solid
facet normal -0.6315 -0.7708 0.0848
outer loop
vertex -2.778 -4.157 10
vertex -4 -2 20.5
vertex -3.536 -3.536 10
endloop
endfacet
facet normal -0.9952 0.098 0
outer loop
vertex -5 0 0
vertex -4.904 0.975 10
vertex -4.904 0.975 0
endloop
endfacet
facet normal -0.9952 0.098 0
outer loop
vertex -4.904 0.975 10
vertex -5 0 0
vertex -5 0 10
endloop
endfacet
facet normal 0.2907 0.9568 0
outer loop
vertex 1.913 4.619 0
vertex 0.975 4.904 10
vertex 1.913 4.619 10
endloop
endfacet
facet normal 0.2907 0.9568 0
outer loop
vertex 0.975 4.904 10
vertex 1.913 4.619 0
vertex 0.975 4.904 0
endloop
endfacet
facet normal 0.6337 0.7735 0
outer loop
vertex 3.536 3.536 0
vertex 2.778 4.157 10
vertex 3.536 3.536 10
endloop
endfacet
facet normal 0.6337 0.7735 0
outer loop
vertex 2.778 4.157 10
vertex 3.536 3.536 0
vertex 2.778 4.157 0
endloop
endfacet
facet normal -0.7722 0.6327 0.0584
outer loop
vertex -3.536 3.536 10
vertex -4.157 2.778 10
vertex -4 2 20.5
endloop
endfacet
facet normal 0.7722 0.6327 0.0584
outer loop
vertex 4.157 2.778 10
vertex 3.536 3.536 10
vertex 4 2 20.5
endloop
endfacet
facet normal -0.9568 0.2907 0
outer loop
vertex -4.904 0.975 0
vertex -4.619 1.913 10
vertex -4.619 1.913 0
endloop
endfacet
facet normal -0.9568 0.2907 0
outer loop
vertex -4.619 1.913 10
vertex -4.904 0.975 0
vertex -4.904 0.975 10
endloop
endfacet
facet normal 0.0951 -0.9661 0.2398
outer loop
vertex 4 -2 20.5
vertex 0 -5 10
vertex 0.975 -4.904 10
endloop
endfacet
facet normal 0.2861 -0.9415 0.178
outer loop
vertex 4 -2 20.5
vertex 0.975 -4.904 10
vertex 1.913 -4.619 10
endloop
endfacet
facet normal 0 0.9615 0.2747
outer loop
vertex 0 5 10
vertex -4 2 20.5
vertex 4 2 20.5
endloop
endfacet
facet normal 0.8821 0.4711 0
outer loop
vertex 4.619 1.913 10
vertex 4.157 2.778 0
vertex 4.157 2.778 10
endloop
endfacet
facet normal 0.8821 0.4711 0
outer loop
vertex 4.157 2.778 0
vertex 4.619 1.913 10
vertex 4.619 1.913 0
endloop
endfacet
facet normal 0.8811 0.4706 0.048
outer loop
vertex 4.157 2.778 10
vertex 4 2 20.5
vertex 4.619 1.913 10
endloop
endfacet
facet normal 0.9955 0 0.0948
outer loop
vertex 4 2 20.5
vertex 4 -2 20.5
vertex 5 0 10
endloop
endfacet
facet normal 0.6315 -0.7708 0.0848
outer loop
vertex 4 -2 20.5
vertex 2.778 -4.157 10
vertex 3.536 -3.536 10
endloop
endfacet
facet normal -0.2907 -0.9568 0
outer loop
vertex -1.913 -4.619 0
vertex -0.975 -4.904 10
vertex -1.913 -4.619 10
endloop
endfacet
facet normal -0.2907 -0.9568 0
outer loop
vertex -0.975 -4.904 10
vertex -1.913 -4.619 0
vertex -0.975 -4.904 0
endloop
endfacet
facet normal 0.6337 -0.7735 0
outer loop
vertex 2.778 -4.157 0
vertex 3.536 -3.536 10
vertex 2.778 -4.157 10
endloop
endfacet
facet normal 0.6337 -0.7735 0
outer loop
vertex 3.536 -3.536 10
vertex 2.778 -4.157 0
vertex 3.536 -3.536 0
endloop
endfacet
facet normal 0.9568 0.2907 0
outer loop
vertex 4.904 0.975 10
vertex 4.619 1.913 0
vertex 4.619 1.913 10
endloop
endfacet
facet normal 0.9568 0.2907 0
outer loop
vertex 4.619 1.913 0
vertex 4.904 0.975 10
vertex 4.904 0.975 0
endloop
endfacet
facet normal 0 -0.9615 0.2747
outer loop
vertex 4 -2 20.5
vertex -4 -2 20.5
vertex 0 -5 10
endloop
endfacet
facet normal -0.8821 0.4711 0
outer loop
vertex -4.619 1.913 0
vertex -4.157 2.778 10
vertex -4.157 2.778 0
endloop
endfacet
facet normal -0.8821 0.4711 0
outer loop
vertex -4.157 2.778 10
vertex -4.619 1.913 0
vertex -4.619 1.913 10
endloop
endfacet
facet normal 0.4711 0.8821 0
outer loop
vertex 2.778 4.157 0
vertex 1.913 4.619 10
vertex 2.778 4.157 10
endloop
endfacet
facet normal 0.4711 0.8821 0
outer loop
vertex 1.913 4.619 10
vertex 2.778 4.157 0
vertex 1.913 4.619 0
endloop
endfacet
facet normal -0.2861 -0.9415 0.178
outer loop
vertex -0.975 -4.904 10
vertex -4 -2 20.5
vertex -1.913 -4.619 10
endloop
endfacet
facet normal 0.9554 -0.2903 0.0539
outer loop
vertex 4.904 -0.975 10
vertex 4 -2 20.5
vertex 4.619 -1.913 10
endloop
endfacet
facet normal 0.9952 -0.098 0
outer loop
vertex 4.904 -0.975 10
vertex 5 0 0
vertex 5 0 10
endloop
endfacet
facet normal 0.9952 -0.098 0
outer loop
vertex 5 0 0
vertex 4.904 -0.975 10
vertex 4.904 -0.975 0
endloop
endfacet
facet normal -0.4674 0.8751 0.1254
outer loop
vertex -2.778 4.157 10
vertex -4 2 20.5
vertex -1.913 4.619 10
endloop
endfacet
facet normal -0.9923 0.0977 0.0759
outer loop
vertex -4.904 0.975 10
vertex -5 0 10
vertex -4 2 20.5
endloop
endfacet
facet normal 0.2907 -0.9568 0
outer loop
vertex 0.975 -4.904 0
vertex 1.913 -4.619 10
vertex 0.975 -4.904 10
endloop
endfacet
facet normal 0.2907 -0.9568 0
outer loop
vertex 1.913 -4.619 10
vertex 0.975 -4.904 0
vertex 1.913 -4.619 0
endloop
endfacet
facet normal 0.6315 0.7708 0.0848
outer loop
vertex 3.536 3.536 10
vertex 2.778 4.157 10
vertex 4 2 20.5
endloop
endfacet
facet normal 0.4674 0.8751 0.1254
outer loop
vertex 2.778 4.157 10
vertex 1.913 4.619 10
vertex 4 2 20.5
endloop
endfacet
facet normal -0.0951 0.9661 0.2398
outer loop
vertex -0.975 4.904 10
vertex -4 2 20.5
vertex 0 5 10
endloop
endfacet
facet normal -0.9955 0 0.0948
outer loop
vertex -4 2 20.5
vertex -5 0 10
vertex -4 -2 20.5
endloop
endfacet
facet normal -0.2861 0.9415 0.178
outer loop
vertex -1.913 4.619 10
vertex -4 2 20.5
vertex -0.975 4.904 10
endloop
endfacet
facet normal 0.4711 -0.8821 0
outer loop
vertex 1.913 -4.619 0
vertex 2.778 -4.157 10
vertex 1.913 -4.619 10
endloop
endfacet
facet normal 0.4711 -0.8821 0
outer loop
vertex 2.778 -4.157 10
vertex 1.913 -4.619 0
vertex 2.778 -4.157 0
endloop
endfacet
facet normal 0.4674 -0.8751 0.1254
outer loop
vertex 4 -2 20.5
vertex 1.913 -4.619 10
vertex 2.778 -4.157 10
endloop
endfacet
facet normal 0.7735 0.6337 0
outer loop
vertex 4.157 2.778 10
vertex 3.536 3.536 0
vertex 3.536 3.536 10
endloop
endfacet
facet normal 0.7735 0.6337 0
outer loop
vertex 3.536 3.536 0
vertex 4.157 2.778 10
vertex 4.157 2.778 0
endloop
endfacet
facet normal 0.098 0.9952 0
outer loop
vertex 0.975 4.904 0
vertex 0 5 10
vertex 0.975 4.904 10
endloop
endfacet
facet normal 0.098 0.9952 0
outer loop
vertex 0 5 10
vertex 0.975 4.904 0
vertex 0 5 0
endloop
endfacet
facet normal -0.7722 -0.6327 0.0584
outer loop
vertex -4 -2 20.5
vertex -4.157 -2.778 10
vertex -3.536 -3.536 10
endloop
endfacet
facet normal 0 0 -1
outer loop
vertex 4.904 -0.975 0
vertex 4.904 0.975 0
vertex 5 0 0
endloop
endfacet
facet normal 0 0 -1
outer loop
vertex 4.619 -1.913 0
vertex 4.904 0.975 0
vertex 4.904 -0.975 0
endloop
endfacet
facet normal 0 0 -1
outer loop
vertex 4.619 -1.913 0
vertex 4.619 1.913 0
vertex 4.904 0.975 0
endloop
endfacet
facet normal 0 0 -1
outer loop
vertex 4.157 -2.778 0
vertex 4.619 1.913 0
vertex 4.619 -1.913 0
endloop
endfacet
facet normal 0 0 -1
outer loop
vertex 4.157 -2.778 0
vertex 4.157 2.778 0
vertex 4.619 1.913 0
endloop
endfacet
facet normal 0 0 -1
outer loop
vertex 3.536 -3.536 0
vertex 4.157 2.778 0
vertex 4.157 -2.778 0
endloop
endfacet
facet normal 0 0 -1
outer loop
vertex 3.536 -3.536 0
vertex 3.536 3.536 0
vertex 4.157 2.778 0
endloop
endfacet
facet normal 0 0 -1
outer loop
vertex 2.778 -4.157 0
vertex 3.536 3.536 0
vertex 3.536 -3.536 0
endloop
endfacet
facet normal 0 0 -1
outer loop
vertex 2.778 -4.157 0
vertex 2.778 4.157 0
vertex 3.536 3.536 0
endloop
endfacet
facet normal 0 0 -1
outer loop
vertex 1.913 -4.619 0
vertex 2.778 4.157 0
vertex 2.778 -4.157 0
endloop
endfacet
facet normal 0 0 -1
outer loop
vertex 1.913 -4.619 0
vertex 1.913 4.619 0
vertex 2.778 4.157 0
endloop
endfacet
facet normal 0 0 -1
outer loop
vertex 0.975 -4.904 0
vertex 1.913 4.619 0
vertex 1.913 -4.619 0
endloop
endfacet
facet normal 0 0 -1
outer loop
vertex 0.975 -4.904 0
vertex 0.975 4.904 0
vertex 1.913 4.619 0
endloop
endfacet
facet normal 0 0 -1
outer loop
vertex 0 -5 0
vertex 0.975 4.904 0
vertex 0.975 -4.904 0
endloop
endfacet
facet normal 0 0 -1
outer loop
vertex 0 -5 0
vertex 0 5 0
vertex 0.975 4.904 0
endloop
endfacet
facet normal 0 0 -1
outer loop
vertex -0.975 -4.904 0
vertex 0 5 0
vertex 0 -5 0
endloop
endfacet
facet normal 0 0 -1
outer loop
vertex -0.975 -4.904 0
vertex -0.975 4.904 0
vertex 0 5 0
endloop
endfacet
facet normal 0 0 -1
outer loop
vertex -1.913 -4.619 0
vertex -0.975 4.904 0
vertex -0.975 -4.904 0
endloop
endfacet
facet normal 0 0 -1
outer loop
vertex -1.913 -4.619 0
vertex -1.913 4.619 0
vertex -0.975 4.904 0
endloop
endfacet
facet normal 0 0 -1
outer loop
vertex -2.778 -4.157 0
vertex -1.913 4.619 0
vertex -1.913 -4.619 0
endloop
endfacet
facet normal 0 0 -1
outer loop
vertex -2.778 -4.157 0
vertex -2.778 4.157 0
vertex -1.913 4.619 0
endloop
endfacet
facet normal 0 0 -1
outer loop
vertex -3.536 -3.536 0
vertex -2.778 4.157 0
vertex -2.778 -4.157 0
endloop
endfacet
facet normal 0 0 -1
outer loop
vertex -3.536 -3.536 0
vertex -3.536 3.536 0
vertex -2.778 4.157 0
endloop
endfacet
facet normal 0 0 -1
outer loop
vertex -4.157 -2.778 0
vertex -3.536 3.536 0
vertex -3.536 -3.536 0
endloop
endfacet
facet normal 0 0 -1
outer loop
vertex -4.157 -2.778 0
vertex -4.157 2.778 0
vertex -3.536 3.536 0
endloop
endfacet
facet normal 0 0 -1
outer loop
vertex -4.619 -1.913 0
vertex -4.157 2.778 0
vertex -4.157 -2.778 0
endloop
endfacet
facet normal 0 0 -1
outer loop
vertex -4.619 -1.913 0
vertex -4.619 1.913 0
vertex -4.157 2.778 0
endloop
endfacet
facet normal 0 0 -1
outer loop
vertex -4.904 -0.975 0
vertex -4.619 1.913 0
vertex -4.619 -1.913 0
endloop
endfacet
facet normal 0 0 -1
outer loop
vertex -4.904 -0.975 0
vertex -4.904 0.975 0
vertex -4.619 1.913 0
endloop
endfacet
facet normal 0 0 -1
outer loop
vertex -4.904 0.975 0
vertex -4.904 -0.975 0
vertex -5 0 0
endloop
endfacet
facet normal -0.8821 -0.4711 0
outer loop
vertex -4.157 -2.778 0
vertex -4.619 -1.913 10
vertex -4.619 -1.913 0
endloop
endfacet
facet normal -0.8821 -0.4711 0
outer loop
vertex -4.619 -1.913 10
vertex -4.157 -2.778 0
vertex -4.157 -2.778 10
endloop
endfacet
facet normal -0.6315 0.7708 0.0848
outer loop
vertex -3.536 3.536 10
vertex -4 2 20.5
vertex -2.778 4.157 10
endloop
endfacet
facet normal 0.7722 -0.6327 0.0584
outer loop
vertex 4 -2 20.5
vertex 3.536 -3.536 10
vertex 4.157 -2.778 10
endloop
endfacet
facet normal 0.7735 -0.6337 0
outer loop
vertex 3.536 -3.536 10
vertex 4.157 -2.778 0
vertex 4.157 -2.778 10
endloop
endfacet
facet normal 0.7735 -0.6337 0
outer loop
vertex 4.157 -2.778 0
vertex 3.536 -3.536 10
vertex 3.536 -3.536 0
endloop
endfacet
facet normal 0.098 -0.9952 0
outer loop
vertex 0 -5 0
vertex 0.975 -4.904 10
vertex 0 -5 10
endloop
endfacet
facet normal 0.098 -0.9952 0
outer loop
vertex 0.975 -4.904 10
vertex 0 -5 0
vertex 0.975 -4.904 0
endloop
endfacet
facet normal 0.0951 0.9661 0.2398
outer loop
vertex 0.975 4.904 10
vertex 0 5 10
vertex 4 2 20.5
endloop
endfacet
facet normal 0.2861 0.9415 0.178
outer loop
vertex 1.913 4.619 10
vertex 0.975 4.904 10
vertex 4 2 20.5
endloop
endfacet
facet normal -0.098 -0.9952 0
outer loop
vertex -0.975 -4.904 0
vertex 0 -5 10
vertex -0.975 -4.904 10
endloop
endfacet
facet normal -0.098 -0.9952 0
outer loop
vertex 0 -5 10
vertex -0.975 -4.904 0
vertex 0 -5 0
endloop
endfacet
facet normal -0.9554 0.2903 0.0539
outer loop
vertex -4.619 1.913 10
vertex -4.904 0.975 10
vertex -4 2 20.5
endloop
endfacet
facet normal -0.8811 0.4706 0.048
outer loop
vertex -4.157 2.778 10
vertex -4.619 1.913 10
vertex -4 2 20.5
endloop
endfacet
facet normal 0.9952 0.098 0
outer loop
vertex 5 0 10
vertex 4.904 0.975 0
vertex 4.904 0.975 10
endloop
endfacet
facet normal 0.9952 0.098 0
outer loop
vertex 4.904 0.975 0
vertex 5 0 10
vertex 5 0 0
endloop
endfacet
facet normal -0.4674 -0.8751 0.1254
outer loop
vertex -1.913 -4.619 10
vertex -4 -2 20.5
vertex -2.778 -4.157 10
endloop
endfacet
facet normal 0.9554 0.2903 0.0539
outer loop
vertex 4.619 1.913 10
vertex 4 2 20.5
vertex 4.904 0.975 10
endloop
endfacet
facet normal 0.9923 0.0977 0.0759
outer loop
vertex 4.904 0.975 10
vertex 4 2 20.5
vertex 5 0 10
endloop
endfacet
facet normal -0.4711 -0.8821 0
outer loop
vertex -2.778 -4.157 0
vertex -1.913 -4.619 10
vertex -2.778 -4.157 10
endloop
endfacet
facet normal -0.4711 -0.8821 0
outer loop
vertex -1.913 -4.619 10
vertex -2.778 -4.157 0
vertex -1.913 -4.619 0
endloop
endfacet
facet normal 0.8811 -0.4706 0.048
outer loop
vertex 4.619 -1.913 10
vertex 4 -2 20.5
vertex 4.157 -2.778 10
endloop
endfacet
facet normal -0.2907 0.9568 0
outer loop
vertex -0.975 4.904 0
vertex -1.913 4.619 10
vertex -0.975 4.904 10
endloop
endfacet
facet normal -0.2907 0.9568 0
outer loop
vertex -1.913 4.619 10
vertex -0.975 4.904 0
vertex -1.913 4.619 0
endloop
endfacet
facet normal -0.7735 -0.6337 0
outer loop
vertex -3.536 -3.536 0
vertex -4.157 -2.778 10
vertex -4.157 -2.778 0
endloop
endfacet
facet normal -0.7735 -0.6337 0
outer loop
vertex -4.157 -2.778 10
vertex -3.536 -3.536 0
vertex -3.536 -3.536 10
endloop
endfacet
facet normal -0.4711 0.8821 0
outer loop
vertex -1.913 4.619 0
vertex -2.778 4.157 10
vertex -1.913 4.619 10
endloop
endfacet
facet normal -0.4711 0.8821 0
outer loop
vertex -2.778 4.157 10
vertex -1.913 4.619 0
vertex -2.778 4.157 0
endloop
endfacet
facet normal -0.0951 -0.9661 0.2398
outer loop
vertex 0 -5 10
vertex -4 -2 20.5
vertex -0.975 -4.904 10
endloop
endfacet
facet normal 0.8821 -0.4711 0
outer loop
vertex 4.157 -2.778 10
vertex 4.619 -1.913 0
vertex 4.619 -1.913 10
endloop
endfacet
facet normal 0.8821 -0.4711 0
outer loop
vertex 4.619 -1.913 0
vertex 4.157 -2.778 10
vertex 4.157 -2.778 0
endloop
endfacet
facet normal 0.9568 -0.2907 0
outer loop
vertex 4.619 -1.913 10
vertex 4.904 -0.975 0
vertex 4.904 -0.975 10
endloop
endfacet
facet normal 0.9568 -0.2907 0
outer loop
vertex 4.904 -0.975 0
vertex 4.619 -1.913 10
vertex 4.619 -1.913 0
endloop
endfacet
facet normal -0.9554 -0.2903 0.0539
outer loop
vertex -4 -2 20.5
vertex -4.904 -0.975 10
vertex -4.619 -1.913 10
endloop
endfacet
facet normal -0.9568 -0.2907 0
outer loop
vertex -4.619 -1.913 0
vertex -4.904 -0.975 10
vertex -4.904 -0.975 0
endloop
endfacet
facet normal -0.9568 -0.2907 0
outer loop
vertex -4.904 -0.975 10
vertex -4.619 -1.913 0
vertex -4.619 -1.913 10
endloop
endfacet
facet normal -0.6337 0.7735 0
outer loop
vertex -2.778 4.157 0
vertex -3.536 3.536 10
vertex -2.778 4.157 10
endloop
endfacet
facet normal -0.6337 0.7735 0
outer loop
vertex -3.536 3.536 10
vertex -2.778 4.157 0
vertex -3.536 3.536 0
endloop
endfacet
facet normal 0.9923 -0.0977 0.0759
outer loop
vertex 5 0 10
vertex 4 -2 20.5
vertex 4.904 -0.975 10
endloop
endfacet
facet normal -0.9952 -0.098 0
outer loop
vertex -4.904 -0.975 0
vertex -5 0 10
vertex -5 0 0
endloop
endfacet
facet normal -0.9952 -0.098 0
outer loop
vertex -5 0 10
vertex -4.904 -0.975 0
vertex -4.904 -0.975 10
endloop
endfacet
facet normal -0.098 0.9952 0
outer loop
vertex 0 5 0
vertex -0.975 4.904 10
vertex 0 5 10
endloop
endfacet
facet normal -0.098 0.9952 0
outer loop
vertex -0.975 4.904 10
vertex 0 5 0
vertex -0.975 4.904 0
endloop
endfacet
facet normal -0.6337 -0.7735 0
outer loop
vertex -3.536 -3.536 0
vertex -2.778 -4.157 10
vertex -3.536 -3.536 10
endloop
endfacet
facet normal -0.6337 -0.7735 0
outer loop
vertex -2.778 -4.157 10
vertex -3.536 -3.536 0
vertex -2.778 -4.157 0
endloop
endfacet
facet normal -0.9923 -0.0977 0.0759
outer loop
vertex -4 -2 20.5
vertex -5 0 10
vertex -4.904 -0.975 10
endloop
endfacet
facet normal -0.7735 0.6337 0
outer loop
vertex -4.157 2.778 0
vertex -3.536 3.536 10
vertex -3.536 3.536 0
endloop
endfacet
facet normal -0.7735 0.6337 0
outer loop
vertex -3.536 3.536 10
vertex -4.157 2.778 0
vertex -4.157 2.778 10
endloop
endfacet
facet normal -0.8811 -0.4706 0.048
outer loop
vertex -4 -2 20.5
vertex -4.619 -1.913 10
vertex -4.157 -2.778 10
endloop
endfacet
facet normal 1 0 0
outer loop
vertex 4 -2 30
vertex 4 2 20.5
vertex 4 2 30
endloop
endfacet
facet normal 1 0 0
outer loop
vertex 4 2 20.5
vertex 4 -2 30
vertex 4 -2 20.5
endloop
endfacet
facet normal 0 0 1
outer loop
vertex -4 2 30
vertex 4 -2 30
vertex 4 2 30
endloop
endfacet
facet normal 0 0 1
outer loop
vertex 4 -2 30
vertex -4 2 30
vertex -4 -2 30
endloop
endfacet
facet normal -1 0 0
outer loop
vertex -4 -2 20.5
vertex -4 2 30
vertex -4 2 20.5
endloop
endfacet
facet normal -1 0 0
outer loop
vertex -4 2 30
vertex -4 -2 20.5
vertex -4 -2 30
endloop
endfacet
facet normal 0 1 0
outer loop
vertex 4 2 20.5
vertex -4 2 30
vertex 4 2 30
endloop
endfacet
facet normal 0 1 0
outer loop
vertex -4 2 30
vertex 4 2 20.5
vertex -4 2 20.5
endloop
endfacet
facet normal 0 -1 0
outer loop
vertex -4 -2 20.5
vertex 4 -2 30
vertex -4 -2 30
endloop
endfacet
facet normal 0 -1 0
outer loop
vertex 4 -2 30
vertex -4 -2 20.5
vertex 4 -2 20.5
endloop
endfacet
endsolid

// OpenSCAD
hull(){
cylinder(10, d = 10, $fn =32);
translate([0,0,20]) cube([8, 4, 1], center = true);
}
translate([0,0,20]) cube([8, 4, 20], center = true);
